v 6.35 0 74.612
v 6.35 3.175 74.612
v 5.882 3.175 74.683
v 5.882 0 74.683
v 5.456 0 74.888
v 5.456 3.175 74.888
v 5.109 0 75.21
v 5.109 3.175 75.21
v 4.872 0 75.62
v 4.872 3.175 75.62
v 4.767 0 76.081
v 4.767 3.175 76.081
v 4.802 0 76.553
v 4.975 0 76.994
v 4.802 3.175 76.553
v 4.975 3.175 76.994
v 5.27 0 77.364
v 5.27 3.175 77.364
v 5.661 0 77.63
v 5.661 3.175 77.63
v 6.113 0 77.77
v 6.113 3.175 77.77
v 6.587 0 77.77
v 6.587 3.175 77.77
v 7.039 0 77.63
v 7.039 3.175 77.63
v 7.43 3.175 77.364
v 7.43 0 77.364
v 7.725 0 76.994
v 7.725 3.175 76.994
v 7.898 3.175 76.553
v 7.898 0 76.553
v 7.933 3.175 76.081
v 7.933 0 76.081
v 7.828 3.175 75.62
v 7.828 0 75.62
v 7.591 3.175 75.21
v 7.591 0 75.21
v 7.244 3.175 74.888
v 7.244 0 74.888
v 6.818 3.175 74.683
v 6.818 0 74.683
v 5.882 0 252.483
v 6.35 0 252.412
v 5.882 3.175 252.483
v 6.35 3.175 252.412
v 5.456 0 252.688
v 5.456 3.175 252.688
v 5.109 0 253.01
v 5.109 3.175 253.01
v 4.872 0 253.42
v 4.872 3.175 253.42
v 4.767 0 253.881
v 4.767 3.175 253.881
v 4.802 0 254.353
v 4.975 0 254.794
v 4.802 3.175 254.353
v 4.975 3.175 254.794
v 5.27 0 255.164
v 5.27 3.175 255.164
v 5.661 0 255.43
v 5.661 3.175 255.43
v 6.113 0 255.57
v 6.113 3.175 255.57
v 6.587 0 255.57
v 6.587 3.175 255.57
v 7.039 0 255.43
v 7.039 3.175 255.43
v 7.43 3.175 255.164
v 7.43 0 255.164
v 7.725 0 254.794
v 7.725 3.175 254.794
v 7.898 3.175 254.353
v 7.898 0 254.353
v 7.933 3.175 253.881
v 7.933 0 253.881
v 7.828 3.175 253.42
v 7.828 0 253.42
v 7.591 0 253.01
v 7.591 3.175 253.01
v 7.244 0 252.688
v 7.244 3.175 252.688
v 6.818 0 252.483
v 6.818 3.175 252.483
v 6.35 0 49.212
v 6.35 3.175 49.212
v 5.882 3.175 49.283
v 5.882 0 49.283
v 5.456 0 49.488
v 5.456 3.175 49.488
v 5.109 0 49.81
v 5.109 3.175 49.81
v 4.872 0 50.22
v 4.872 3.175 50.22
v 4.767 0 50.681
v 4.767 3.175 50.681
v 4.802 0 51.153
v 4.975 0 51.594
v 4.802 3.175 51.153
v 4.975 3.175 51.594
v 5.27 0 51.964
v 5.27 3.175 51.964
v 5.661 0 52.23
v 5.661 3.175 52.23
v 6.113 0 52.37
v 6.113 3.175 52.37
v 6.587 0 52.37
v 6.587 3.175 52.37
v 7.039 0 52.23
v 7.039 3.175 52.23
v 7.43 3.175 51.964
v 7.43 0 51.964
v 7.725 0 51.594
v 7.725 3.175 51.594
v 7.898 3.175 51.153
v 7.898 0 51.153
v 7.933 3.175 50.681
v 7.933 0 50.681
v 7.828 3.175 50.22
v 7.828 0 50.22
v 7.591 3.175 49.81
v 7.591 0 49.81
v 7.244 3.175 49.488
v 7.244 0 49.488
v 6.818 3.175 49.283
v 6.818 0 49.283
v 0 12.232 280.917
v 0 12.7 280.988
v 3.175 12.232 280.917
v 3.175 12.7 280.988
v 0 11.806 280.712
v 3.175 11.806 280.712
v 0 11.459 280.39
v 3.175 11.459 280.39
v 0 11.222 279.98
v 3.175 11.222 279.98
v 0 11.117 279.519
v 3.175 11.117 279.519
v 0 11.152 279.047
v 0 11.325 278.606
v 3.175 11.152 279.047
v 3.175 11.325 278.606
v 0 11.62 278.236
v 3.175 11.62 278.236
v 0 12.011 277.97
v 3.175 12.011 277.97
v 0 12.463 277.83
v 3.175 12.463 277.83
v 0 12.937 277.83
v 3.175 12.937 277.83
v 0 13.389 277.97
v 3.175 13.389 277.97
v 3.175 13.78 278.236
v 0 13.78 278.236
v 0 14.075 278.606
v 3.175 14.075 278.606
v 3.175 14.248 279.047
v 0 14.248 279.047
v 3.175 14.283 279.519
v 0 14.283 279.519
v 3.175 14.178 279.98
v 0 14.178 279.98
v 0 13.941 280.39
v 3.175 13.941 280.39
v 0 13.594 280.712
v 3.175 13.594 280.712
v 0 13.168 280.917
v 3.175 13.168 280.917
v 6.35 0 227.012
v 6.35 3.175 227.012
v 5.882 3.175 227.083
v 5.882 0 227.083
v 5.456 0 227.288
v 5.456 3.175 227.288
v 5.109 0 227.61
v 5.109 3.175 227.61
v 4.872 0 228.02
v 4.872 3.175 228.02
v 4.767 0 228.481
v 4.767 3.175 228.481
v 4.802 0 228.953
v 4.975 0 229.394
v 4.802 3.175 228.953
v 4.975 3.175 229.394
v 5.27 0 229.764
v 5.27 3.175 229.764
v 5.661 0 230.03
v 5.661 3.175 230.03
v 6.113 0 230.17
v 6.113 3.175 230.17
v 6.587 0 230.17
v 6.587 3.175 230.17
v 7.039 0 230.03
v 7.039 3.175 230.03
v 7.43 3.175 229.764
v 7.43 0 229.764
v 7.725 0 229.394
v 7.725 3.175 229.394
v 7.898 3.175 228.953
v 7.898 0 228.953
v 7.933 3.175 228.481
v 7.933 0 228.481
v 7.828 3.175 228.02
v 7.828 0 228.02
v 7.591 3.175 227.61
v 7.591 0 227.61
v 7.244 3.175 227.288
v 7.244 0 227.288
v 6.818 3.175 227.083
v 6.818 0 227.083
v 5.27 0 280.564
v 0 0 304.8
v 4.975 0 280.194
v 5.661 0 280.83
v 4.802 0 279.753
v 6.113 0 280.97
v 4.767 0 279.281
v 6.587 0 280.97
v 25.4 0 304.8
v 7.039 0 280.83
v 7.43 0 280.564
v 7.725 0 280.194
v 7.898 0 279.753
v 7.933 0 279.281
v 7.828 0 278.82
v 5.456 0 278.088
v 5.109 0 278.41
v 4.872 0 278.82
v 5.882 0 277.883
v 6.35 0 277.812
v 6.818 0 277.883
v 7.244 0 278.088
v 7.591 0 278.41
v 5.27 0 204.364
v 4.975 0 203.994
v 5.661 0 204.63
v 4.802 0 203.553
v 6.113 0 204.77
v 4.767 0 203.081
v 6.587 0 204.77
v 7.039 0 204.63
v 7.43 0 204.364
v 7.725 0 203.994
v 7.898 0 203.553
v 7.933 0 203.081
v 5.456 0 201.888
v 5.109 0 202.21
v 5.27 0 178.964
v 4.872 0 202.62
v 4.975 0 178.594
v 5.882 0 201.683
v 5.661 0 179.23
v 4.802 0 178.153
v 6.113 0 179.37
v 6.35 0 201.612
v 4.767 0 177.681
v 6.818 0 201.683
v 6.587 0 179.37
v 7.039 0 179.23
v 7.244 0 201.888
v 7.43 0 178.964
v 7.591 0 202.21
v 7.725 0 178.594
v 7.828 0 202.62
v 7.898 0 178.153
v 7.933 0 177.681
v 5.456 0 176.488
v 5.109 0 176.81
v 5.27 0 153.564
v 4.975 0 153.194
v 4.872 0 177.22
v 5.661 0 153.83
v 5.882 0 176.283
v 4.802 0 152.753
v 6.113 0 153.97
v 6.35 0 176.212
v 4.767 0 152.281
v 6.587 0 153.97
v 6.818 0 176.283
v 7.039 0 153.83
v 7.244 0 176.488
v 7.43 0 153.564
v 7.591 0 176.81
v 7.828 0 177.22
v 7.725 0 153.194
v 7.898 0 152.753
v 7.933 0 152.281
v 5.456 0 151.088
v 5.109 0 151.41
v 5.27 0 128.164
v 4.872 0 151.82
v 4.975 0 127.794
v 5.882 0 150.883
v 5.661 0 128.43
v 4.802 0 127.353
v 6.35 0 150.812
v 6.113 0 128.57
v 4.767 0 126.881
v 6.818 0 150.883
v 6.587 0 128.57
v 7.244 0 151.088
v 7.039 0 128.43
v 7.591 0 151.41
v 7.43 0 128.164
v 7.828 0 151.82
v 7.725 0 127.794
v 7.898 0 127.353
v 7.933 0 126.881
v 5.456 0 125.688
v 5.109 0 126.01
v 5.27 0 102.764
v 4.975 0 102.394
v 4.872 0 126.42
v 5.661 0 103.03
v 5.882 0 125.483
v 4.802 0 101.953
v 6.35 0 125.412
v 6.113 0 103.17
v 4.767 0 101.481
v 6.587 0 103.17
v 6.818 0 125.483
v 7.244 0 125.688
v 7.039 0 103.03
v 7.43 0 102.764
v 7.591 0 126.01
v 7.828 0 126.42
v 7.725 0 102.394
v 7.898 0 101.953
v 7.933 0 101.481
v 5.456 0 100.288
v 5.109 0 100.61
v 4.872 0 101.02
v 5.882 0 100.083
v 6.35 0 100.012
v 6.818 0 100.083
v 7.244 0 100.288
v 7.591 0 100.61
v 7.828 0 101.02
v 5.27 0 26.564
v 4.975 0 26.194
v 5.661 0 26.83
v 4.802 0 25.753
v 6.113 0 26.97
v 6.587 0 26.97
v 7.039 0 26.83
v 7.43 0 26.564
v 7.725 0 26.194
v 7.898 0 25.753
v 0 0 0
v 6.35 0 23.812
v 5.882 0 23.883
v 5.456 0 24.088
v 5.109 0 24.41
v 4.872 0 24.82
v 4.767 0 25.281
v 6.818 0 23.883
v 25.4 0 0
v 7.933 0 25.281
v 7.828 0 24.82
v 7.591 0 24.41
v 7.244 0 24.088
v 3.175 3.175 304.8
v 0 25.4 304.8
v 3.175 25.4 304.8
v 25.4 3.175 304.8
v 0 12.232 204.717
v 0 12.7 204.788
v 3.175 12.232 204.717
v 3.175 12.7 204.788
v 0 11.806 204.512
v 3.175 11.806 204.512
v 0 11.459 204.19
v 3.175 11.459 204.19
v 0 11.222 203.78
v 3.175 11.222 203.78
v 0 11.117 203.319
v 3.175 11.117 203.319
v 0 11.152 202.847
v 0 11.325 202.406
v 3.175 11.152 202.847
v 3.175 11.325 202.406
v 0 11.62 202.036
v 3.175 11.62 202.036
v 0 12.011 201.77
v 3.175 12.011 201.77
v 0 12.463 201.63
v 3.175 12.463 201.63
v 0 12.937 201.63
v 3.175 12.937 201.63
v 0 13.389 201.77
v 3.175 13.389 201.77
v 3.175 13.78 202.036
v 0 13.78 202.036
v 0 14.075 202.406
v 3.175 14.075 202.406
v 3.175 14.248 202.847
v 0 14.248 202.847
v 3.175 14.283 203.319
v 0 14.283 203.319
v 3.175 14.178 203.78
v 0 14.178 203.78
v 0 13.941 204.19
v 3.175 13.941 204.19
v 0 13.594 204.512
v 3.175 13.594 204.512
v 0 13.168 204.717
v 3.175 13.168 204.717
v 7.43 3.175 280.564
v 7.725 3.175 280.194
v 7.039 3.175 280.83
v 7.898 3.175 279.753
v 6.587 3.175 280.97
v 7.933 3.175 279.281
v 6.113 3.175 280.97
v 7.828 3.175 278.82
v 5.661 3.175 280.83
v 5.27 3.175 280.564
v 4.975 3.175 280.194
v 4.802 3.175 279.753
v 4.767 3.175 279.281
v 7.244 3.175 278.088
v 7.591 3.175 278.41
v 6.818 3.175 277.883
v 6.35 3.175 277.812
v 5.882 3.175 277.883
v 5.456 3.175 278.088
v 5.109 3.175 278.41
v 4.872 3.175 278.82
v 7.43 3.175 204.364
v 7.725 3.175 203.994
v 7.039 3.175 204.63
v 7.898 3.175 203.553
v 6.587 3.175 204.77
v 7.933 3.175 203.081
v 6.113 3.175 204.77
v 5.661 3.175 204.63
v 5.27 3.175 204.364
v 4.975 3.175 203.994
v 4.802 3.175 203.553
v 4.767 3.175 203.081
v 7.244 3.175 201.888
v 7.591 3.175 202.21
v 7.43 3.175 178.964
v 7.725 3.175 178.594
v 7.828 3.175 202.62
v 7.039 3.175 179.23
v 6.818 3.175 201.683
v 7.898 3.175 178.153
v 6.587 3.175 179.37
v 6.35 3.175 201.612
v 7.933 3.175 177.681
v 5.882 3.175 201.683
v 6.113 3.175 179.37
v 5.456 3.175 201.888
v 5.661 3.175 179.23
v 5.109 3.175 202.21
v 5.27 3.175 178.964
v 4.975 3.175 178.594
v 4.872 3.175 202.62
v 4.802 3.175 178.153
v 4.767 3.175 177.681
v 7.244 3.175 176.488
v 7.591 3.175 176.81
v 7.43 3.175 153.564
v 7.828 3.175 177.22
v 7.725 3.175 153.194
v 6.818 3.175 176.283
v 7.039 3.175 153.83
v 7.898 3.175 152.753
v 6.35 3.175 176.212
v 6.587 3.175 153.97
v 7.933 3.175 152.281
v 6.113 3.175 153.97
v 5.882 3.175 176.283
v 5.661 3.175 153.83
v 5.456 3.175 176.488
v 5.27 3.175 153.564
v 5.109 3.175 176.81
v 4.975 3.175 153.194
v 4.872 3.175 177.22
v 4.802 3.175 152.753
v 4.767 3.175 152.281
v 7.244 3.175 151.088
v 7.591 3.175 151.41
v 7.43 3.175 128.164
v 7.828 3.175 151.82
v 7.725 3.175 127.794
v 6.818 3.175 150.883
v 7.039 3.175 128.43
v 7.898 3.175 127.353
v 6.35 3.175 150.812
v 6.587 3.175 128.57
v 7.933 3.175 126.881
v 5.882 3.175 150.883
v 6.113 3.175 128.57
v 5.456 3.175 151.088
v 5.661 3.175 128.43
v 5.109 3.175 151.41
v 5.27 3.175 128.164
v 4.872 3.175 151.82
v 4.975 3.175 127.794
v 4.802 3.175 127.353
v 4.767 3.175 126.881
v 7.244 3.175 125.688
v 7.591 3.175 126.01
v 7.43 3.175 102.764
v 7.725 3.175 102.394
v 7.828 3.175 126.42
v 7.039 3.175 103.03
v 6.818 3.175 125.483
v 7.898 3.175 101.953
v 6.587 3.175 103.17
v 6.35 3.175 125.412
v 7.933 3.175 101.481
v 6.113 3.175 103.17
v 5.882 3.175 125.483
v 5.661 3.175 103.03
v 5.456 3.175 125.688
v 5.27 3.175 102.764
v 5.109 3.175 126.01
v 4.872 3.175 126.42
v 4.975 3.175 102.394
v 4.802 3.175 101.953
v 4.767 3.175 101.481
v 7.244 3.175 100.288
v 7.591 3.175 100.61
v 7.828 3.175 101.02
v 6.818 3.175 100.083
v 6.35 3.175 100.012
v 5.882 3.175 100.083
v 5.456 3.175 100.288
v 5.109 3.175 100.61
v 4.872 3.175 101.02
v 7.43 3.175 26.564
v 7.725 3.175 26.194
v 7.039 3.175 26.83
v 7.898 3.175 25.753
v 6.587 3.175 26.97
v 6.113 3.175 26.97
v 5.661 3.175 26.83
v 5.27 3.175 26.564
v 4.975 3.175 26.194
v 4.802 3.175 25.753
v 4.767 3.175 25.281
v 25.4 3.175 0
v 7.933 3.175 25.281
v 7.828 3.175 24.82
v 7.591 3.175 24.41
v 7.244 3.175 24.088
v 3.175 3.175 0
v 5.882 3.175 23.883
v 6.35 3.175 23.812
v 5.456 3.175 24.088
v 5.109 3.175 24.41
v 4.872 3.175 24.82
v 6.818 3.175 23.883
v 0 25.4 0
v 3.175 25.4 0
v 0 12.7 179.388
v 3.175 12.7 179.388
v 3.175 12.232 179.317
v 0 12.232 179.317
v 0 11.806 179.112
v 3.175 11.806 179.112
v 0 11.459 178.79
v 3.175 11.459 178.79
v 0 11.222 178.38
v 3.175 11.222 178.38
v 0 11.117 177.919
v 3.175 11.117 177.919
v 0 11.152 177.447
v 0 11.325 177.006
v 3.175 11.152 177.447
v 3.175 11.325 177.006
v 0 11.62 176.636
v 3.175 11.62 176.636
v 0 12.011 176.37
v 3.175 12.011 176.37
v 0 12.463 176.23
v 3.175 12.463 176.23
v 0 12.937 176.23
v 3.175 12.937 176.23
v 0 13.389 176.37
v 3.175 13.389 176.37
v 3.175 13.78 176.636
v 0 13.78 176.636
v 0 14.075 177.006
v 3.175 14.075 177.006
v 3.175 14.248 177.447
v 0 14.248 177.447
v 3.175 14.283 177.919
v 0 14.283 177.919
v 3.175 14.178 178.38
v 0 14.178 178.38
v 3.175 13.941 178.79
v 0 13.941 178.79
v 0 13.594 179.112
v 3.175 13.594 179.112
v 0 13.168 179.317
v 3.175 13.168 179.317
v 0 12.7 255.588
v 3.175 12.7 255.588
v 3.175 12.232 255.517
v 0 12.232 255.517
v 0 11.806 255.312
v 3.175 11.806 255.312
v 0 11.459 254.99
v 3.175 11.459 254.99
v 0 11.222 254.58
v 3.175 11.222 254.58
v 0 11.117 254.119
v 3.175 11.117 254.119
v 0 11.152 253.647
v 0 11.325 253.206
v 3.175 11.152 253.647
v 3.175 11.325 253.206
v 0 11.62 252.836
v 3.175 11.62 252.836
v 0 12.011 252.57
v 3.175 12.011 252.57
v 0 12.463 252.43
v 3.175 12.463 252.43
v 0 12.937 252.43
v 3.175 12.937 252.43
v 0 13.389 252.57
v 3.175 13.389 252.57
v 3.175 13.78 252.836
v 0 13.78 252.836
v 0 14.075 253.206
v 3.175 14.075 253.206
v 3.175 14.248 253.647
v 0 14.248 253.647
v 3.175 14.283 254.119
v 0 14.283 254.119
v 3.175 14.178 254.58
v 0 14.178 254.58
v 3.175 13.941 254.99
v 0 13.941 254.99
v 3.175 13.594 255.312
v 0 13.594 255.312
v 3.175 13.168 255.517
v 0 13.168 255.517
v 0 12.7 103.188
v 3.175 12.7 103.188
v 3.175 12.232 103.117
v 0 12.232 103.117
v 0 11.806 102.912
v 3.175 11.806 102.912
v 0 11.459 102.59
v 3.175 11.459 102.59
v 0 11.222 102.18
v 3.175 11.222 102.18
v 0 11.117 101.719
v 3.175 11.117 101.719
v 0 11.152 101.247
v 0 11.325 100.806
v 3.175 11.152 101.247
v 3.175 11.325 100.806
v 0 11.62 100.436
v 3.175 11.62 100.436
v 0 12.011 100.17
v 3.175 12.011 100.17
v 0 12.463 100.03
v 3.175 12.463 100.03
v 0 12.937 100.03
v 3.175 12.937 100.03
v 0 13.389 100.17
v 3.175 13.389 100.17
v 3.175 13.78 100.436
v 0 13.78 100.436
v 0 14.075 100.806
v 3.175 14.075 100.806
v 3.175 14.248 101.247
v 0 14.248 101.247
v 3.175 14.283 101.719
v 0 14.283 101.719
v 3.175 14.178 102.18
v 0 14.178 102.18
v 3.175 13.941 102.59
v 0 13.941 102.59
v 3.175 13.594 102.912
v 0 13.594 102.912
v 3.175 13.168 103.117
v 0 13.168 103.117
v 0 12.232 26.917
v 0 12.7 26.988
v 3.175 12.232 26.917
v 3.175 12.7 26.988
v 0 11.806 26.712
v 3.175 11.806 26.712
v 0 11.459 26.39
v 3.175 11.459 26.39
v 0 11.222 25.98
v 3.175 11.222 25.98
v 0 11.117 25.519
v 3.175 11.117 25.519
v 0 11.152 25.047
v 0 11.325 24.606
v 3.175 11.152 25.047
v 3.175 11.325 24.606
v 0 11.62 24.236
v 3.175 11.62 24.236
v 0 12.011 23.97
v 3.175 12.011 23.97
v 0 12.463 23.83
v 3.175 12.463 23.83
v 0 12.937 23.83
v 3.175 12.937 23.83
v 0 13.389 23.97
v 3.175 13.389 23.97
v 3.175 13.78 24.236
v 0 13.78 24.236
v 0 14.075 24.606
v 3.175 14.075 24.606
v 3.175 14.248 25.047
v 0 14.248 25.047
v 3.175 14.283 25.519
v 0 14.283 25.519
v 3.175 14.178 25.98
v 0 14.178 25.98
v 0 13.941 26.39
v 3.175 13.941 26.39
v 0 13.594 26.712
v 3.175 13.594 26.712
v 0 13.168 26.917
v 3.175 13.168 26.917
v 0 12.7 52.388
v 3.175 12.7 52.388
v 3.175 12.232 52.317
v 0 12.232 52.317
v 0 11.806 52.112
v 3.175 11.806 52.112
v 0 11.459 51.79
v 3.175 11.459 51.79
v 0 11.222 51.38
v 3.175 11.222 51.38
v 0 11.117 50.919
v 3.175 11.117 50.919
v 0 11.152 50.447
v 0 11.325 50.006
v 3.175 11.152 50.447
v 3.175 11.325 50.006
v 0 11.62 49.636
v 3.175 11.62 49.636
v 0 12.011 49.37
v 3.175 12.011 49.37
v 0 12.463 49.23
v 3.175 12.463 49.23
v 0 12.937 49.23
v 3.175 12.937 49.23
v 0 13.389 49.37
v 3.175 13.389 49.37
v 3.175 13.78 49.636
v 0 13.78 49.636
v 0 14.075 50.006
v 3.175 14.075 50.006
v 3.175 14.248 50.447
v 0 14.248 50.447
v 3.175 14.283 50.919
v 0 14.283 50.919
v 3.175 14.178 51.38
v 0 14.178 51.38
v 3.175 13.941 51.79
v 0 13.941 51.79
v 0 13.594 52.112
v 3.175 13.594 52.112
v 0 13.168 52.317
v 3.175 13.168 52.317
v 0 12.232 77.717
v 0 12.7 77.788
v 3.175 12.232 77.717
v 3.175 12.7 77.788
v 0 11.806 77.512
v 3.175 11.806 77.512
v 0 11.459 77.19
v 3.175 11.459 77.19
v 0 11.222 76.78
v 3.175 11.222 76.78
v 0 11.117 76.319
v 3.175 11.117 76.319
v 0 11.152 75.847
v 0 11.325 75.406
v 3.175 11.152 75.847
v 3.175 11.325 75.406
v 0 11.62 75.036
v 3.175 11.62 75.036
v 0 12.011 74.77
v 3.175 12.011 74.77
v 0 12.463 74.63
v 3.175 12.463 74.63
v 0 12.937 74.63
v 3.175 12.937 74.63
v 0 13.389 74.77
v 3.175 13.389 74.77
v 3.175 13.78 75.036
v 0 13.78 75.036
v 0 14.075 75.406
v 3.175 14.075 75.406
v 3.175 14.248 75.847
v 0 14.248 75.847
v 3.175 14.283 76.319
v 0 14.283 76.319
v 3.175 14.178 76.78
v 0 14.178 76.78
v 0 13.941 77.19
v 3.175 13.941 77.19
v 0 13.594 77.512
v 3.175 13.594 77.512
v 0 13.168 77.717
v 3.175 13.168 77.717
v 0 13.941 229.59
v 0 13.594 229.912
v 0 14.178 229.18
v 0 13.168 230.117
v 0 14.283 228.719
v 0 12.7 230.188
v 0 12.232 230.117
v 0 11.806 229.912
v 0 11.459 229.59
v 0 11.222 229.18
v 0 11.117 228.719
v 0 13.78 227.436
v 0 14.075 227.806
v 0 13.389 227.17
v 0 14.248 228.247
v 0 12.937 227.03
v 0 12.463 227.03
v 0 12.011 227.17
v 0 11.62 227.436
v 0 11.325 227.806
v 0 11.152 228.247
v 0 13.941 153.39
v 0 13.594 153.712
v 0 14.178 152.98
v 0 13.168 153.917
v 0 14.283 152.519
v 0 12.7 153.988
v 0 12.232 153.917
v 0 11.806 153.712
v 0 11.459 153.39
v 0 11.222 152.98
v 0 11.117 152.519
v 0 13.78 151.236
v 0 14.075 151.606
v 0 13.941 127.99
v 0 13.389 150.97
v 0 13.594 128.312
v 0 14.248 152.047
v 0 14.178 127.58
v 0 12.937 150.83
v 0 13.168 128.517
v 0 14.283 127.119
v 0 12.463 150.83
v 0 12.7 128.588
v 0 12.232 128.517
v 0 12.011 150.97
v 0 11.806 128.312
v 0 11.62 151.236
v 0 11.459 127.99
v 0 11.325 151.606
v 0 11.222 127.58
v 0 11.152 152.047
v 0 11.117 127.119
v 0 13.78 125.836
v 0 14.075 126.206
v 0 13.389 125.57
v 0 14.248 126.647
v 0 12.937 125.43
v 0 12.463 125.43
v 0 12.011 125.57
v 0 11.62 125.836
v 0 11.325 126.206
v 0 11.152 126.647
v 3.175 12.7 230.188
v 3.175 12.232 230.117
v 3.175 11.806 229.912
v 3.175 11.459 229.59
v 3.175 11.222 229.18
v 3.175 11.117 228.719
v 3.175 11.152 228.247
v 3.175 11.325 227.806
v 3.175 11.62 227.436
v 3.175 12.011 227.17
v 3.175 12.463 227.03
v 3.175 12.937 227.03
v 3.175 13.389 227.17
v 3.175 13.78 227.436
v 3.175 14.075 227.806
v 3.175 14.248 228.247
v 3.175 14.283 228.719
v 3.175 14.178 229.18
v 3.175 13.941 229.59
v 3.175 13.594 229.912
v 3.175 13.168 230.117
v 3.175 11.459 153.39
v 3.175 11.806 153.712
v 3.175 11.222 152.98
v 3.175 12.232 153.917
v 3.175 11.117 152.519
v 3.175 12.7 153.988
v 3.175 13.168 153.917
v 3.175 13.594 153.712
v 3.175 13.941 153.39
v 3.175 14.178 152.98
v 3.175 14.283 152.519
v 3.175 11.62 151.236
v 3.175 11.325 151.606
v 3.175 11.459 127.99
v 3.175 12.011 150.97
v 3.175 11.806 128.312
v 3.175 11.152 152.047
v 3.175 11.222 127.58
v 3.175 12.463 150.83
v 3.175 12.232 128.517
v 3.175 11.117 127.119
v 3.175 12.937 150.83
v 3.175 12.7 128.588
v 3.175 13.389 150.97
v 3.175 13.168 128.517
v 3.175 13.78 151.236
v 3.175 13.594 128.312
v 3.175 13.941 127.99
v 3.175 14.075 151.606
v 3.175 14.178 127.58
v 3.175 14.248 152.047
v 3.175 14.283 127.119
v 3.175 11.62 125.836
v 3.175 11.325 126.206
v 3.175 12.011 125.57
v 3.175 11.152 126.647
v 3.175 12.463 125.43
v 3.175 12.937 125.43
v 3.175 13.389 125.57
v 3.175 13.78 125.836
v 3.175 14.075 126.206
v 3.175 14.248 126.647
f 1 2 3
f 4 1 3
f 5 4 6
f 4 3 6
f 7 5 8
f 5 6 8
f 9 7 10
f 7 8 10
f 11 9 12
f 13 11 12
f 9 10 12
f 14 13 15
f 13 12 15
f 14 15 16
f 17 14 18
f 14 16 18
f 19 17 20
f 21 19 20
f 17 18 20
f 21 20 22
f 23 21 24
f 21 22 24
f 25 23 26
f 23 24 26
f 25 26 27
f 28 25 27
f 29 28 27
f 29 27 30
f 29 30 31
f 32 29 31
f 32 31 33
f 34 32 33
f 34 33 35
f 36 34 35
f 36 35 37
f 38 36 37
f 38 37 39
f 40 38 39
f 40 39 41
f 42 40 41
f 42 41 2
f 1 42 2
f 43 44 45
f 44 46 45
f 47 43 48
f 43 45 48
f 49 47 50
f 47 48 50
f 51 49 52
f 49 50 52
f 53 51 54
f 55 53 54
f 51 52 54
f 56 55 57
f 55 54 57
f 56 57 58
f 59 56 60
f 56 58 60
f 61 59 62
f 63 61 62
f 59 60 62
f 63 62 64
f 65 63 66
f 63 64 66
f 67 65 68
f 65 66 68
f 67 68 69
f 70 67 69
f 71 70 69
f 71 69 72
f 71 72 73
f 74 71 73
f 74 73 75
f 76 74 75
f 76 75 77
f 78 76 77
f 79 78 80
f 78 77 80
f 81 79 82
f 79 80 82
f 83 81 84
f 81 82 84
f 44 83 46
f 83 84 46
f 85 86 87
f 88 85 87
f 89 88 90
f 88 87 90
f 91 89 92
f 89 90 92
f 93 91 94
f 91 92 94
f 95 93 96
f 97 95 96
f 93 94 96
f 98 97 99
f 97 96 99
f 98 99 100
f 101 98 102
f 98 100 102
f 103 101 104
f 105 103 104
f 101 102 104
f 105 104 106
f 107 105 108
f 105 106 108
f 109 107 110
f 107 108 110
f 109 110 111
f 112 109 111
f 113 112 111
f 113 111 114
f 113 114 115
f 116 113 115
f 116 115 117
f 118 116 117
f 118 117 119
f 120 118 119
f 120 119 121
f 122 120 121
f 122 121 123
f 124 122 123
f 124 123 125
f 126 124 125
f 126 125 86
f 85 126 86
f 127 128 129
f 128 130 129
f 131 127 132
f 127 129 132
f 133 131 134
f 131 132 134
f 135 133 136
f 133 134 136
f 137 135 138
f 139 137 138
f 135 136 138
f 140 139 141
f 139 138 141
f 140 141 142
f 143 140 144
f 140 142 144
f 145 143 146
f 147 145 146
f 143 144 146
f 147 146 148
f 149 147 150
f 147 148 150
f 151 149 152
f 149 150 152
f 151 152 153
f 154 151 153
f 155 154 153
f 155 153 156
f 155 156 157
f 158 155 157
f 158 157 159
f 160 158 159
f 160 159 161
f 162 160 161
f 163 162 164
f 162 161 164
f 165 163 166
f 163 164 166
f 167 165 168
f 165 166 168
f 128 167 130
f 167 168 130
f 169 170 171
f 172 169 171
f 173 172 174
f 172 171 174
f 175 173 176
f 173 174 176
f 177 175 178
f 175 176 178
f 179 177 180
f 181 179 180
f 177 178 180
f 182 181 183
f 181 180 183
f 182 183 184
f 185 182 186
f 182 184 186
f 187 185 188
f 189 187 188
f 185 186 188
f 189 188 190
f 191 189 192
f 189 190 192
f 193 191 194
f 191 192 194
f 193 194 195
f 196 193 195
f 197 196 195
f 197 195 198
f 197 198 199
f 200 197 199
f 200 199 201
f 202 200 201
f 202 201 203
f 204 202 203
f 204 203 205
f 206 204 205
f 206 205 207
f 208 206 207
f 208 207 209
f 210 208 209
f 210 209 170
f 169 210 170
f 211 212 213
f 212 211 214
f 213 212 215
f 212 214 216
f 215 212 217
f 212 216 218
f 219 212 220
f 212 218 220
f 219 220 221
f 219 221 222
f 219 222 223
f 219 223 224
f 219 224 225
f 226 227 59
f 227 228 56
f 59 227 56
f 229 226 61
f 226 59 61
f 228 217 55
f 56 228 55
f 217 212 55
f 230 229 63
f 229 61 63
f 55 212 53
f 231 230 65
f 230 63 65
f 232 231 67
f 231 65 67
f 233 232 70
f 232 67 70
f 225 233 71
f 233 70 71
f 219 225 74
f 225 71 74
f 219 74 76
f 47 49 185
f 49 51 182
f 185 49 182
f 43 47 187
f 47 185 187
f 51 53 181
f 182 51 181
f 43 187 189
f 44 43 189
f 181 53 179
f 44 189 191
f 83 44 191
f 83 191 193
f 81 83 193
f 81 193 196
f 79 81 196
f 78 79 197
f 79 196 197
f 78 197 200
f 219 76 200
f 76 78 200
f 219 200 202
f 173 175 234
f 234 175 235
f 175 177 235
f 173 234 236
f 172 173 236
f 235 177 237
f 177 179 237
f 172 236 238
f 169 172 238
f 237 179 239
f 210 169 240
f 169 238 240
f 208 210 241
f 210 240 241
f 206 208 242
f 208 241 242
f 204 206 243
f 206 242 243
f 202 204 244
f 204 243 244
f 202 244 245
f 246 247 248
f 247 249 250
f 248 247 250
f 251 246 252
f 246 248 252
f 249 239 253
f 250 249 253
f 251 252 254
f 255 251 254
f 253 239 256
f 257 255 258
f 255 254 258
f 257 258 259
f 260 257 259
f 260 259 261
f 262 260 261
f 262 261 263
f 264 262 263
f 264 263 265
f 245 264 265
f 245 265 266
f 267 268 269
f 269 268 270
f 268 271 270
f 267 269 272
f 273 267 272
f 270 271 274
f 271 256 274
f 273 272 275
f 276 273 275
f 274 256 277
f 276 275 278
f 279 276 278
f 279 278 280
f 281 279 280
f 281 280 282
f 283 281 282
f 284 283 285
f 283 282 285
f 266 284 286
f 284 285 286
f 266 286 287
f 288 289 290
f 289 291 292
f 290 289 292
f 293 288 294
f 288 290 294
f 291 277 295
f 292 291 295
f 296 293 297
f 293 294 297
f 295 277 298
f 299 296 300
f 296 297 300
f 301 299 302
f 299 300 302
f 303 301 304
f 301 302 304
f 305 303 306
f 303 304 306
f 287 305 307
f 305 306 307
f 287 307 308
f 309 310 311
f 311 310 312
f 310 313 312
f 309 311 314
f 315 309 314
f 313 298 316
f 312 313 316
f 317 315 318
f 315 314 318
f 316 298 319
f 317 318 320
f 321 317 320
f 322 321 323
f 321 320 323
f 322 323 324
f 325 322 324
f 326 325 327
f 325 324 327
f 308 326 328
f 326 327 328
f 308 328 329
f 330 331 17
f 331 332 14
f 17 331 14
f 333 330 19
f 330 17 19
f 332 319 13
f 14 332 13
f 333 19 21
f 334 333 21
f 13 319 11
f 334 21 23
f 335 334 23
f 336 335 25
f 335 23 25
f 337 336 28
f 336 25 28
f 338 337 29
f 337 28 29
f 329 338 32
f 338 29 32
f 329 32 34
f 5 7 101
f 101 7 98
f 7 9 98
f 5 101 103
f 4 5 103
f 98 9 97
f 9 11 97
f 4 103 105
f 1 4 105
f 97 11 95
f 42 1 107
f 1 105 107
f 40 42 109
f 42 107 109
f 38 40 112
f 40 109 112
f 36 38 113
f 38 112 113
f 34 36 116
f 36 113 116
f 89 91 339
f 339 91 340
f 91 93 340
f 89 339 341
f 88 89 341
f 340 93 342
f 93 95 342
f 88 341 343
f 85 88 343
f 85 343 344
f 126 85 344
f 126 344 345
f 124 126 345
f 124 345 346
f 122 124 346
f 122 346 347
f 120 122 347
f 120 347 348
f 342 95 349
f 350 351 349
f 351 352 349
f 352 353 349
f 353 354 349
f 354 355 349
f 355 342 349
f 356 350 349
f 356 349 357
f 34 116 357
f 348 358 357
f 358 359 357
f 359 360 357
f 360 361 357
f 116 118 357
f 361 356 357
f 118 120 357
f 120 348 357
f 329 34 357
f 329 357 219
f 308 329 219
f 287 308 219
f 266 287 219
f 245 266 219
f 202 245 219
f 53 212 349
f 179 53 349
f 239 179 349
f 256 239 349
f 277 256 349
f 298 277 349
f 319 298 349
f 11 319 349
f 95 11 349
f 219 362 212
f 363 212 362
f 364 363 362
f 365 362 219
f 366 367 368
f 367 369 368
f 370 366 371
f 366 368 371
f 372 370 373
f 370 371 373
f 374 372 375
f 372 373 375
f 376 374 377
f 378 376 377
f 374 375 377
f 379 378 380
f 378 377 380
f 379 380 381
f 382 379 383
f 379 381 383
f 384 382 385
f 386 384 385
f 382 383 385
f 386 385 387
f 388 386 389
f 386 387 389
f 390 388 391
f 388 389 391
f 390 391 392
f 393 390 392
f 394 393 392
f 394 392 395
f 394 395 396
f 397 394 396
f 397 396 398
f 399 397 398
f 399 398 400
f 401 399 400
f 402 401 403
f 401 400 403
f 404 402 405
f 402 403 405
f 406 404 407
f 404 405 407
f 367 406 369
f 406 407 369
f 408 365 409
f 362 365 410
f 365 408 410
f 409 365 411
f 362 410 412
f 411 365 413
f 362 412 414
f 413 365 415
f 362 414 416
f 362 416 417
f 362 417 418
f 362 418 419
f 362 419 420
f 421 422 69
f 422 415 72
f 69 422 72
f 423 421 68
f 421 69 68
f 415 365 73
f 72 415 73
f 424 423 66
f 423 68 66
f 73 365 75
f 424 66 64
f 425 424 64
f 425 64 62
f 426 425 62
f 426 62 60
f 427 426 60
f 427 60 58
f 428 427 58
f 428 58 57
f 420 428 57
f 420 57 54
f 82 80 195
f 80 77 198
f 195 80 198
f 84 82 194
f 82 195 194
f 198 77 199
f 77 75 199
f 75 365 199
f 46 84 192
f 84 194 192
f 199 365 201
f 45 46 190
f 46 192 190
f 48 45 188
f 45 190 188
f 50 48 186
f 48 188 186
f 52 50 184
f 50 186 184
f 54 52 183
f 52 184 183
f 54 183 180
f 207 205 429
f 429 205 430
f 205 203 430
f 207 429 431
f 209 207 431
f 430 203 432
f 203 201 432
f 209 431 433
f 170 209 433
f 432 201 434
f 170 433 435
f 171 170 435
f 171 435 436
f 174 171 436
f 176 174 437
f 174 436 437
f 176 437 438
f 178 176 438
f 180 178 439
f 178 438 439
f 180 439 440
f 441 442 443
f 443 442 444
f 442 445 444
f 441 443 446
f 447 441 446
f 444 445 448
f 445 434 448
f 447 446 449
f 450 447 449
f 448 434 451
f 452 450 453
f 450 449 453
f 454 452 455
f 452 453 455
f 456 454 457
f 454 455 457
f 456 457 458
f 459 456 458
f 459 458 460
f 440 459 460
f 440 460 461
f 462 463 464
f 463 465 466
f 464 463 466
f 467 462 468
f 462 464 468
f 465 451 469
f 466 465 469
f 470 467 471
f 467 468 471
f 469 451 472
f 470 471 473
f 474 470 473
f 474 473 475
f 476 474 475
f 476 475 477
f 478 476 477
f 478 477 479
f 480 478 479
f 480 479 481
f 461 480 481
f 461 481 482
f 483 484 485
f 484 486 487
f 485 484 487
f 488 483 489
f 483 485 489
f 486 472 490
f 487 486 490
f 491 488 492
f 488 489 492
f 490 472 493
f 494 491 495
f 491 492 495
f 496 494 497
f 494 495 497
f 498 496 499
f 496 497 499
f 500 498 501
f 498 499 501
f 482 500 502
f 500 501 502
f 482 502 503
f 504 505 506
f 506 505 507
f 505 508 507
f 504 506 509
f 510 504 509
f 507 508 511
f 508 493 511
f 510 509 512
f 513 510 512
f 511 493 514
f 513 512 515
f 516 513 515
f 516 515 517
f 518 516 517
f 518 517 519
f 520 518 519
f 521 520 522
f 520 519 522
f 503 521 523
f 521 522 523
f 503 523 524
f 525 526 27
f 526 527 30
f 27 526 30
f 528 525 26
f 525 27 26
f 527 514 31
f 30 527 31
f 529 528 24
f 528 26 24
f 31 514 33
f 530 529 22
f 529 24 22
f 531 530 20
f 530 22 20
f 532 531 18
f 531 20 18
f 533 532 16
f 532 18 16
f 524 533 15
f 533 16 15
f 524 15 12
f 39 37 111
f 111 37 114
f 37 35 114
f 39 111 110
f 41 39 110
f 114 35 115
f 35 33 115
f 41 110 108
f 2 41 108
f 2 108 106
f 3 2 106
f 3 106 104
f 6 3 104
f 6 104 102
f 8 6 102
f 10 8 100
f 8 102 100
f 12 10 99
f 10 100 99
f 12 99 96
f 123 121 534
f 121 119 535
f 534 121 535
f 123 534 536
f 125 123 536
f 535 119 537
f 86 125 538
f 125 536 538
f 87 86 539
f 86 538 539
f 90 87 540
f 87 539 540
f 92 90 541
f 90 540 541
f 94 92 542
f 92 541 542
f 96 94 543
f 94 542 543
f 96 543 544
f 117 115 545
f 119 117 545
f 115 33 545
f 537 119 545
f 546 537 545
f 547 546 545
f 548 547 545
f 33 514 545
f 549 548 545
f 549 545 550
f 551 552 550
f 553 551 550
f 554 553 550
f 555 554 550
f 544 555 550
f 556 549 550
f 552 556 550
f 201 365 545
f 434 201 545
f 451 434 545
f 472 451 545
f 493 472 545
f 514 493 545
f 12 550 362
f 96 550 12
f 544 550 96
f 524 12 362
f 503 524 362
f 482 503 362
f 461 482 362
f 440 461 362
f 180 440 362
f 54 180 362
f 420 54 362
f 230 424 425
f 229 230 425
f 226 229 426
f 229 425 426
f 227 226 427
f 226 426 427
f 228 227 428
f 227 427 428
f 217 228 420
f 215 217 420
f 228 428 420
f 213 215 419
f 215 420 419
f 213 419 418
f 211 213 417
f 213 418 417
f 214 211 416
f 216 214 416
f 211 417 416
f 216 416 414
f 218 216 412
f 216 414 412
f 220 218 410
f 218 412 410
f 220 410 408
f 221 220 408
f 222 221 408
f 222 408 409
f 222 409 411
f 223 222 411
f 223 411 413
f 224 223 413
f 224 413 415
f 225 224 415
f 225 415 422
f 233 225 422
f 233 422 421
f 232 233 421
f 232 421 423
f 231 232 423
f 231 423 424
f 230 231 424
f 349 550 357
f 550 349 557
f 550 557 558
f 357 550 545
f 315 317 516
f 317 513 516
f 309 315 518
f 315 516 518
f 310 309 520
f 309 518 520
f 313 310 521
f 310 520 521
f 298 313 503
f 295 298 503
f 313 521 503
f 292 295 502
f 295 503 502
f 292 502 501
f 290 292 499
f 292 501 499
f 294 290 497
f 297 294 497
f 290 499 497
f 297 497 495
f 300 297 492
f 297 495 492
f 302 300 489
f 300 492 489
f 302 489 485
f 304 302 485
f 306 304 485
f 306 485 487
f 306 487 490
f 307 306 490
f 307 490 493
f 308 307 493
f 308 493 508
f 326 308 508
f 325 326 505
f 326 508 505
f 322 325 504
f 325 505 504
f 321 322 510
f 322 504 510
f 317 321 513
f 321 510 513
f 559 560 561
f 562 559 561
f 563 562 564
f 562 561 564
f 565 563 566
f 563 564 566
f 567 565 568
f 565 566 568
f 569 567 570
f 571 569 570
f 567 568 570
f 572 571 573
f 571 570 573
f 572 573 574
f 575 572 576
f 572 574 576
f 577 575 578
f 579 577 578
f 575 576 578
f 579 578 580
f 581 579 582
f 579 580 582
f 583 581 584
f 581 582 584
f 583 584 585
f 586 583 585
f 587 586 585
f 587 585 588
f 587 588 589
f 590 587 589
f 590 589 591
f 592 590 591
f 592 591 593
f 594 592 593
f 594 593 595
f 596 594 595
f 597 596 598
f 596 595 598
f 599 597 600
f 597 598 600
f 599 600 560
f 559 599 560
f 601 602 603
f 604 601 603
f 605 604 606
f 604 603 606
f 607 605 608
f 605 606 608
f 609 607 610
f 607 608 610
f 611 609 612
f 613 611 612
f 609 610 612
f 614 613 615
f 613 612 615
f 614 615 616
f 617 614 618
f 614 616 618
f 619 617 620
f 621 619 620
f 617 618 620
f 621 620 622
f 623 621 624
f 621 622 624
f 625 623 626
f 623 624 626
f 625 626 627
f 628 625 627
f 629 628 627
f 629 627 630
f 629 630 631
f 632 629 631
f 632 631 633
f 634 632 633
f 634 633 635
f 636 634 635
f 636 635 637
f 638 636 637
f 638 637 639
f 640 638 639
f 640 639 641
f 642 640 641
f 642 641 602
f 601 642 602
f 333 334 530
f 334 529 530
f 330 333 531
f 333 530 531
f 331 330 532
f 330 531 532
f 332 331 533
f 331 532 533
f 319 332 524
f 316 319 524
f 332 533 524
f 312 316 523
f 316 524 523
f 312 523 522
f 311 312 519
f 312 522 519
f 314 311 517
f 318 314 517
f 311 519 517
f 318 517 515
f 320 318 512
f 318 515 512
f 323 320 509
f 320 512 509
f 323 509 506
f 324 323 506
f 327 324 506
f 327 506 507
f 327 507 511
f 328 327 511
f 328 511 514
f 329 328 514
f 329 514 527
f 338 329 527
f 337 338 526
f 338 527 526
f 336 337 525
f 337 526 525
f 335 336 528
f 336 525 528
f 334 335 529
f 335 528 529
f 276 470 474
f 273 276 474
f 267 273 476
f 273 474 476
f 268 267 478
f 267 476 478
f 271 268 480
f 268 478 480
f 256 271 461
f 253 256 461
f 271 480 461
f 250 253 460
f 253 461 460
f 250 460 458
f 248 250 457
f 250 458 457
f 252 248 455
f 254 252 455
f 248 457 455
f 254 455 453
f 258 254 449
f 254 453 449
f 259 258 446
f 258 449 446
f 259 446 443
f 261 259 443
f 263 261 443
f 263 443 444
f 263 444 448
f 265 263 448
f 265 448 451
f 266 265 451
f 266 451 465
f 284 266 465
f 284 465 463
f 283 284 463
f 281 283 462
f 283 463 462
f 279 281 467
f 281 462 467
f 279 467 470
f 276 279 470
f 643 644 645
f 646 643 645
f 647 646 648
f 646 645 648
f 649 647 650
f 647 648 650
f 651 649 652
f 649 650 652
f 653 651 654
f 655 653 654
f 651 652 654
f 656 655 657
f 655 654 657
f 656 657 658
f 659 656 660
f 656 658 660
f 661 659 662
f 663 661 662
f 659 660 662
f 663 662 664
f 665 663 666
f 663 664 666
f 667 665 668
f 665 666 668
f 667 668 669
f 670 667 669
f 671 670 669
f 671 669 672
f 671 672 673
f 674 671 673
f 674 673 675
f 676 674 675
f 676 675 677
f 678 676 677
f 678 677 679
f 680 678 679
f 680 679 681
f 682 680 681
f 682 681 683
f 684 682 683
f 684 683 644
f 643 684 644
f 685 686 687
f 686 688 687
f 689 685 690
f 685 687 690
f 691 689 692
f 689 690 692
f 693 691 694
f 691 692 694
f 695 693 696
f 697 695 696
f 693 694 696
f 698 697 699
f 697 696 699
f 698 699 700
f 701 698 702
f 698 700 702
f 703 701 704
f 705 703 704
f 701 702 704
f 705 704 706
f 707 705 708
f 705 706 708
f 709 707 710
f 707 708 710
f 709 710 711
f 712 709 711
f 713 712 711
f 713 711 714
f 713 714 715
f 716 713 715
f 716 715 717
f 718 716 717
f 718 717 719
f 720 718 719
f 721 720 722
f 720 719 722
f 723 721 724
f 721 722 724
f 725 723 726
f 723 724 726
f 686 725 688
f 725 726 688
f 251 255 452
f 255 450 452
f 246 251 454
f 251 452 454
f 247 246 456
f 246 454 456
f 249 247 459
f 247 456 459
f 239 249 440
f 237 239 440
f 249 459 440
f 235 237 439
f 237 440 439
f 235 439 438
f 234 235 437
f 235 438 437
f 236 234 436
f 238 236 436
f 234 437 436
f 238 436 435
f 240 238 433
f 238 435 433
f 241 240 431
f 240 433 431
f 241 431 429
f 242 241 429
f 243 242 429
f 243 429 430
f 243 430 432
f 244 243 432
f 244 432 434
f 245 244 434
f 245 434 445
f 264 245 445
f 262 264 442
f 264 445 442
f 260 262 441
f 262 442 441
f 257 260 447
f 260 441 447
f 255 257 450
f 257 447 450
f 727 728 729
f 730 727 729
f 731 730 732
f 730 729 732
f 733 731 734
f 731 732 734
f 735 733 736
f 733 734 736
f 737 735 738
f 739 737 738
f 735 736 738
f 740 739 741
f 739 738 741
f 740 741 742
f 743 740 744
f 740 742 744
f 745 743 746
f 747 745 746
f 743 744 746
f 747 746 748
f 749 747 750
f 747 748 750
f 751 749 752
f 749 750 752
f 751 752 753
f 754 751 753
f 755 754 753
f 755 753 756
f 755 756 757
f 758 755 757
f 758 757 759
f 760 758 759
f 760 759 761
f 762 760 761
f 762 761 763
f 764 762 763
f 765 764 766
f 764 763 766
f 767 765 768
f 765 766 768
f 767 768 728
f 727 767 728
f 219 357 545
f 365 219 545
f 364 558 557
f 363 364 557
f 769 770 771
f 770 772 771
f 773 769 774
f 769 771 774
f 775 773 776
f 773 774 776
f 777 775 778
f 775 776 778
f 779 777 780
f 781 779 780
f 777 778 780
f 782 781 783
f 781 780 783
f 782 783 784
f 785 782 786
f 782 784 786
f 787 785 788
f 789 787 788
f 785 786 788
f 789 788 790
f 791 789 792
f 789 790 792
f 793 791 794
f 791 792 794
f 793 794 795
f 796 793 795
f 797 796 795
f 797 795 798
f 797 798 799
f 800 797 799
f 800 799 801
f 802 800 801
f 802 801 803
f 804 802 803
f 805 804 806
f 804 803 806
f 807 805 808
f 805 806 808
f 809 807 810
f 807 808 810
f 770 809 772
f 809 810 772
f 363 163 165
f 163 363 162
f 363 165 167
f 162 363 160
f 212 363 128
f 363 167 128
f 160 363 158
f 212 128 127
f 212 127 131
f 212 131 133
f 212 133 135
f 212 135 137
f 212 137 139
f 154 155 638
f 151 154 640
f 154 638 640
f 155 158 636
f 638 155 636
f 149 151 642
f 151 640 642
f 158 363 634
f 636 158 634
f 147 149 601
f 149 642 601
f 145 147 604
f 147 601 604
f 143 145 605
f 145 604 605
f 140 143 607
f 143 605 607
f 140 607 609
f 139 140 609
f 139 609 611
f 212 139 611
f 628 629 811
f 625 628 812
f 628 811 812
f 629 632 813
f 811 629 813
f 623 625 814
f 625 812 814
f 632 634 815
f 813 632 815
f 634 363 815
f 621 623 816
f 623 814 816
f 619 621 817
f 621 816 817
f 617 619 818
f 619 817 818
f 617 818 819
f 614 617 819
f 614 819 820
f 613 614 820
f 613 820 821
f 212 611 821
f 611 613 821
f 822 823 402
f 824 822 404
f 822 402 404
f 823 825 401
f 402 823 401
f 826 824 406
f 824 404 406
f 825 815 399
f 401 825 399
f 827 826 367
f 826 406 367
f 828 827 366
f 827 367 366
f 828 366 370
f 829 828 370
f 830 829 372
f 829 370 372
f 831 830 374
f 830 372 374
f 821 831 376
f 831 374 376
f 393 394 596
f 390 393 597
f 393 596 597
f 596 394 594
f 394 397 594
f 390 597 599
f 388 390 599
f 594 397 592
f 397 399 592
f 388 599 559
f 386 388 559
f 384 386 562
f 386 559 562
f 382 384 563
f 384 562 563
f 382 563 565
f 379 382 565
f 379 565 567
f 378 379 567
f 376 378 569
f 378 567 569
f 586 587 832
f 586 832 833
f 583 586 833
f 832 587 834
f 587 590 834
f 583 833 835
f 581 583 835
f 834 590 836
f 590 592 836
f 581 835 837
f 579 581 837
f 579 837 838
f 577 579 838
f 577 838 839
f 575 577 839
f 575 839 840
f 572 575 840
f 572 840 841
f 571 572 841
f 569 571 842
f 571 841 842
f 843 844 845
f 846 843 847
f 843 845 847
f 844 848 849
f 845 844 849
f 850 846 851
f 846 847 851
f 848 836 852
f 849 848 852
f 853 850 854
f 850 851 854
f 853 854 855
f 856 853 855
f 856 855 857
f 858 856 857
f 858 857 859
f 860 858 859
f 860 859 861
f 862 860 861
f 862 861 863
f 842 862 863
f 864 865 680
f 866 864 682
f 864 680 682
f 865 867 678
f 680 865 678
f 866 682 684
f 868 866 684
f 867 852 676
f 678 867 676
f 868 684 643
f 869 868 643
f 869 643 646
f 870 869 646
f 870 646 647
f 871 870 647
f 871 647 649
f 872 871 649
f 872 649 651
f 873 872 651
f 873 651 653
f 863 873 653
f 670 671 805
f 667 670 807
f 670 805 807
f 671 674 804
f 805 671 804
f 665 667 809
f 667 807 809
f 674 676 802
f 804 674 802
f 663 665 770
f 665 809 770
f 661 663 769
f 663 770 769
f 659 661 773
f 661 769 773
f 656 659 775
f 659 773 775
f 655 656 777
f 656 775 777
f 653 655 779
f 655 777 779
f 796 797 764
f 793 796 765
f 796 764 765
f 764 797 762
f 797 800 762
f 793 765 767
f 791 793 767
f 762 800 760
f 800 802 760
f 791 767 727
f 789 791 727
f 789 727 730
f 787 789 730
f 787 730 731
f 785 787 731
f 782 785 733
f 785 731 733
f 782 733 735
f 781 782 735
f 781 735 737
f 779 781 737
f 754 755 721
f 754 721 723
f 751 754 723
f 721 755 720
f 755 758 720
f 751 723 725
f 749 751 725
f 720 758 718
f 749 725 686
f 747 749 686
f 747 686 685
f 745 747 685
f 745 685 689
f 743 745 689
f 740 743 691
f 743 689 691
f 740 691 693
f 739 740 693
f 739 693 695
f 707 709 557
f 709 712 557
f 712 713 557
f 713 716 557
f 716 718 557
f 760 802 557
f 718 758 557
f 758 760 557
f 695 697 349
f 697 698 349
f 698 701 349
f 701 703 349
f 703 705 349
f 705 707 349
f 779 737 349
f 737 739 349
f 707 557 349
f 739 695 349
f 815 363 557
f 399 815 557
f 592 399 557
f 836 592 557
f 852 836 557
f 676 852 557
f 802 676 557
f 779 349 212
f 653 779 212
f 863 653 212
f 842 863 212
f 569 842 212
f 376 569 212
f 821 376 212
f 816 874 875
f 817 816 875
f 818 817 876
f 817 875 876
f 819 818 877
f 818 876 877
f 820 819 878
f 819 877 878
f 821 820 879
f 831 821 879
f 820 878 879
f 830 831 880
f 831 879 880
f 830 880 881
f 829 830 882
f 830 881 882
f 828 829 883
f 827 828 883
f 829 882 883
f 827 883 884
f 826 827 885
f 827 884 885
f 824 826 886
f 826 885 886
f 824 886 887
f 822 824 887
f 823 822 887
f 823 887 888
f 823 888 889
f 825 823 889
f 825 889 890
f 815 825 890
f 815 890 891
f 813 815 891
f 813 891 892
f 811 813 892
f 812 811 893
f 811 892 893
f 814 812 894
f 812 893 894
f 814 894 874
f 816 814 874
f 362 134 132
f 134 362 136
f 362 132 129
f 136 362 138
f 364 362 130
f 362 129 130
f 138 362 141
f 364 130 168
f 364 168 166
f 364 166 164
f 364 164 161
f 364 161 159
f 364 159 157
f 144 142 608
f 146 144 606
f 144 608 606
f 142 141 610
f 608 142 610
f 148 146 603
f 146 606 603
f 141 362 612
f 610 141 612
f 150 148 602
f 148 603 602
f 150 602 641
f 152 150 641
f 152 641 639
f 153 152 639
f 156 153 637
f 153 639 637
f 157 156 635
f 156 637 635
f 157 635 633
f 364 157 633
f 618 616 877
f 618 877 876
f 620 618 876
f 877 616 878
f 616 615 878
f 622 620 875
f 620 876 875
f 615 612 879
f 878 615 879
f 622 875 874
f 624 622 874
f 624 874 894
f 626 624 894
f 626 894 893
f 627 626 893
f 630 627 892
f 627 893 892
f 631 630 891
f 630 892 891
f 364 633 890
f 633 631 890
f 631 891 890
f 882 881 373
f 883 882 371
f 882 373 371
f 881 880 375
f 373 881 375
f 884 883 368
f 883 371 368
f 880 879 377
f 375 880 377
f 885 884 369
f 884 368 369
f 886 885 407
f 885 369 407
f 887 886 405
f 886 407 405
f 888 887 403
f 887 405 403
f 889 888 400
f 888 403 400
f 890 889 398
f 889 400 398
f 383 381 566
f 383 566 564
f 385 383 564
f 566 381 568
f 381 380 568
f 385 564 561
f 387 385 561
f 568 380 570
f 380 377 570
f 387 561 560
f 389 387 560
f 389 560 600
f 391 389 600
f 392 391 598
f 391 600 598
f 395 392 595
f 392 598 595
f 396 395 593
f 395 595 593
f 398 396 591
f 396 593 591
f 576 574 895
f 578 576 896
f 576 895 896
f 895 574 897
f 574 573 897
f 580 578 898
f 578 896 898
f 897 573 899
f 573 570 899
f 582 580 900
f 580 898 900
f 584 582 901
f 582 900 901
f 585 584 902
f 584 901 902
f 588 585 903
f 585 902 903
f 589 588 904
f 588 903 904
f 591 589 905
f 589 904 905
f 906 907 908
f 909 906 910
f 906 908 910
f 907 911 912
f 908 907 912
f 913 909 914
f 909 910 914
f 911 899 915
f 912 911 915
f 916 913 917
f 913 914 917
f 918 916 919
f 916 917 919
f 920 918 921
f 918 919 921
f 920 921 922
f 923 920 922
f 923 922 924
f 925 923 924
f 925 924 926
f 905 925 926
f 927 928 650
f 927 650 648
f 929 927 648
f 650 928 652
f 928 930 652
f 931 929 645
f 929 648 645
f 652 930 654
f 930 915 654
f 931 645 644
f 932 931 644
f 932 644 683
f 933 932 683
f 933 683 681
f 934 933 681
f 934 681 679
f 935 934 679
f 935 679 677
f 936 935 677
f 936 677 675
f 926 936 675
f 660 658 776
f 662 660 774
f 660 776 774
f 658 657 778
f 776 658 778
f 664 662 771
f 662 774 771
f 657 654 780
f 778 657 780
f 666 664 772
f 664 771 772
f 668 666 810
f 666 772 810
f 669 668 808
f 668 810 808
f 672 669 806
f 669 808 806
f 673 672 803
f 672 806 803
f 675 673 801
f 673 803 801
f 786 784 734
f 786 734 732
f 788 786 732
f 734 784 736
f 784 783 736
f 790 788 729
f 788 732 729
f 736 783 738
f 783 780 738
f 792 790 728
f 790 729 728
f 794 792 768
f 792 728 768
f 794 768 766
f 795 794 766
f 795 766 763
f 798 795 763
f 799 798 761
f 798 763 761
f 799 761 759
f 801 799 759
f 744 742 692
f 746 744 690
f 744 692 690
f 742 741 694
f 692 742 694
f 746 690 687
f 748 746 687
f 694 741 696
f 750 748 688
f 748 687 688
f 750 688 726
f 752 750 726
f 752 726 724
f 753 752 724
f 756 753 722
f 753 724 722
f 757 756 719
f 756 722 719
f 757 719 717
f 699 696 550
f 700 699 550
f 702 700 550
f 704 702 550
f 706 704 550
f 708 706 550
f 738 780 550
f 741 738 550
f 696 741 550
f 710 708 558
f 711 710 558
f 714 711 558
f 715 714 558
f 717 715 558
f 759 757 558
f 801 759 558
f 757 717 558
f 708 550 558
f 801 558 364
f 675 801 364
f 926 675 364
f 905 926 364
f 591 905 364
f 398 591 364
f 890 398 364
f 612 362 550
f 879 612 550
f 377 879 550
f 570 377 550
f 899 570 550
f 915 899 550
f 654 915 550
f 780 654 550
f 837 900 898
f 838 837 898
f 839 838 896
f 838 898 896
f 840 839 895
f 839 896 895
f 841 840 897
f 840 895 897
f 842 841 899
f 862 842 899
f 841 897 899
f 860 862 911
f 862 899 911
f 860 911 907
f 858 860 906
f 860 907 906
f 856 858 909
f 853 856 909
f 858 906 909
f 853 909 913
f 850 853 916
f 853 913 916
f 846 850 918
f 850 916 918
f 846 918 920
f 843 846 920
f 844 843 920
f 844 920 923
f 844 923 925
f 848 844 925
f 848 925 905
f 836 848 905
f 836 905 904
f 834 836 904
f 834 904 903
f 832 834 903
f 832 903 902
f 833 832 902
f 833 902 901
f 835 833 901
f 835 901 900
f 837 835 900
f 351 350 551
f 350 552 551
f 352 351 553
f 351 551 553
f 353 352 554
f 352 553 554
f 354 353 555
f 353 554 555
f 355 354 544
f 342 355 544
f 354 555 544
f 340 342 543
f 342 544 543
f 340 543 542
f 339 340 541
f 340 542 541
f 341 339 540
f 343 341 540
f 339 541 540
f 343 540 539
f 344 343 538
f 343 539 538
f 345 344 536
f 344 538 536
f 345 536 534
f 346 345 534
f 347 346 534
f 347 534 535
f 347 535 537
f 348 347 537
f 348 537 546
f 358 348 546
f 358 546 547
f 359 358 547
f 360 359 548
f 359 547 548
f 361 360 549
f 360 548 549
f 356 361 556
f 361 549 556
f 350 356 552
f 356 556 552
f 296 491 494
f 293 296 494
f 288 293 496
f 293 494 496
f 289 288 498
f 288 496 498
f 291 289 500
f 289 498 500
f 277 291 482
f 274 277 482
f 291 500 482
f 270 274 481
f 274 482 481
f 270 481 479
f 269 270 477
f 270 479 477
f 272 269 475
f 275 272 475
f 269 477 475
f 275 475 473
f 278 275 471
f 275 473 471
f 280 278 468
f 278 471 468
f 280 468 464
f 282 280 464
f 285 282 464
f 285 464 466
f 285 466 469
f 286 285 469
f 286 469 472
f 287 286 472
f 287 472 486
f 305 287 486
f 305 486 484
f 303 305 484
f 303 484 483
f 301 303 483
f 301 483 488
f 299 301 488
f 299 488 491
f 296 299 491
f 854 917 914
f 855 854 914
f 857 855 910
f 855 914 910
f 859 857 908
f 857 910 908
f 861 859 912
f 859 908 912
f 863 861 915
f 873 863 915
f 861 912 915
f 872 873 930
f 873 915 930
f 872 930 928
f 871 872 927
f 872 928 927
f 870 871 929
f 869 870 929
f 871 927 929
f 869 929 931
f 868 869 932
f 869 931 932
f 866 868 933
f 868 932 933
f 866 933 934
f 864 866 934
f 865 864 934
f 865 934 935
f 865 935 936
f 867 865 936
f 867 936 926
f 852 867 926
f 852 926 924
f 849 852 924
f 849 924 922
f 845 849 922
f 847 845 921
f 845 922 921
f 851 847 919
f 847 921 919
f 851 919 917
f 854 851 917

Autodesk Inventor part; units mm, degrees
ref_plane "YZ Plane" through (0, 0, 0) normal (1, 0, 0) x (0, 1, 0)
ref_plane "XZ Plane" through (0, 0, 0) normal (0, 1, 0) x (-1, 0, 0)
ref_plane "XY Plane" through (0, 0, 0) normal (0, 0, 1) x (1, 0, 0)
sketch "Sketch1" plane through (0, 0, 0) normal (0, 0, 1) x (1, 0, 0)
  line L0 (0, 25.4) -> (0, 0)
  line L1 (0, 0) -> (25.4, 0)
  line L2 (25.4, 0) -> (25.4, 3.175)
  line L3 (25.4, 3.175) -> (3.175, 3.175)
  line L4 (3.175, 3.175) -> (3.175, 25.4)
  line L5 (3.175, 25.4) -> (0, 25.4)
  dimension "d11" = 25.4
  dimension "d12" = 25.4
  dimension "d13" = 3.175
  dimension "d14" = 3.175
extrude "Extrusion1" add sketch "Sketch1" along normal blind 304.8
hole "Hole1" at (6.35, 0, 25.4) direction (0, 1, 0) diameter 3.175 end through all
hole "Hole2" at (0, 12.7, 25.4) direction (1, 0, 0) diameter 3.175 end through all
pattern_linear "Rectangular Pattern1" count 11 spacing 25.4 along (0, 0, 1) of "Hole1"
pattern_linear "Rectangular Pattern2" count 11 spacing 25.4 along (0, 0, 1) of "Hole2"
properties part number "Fer Angle"
